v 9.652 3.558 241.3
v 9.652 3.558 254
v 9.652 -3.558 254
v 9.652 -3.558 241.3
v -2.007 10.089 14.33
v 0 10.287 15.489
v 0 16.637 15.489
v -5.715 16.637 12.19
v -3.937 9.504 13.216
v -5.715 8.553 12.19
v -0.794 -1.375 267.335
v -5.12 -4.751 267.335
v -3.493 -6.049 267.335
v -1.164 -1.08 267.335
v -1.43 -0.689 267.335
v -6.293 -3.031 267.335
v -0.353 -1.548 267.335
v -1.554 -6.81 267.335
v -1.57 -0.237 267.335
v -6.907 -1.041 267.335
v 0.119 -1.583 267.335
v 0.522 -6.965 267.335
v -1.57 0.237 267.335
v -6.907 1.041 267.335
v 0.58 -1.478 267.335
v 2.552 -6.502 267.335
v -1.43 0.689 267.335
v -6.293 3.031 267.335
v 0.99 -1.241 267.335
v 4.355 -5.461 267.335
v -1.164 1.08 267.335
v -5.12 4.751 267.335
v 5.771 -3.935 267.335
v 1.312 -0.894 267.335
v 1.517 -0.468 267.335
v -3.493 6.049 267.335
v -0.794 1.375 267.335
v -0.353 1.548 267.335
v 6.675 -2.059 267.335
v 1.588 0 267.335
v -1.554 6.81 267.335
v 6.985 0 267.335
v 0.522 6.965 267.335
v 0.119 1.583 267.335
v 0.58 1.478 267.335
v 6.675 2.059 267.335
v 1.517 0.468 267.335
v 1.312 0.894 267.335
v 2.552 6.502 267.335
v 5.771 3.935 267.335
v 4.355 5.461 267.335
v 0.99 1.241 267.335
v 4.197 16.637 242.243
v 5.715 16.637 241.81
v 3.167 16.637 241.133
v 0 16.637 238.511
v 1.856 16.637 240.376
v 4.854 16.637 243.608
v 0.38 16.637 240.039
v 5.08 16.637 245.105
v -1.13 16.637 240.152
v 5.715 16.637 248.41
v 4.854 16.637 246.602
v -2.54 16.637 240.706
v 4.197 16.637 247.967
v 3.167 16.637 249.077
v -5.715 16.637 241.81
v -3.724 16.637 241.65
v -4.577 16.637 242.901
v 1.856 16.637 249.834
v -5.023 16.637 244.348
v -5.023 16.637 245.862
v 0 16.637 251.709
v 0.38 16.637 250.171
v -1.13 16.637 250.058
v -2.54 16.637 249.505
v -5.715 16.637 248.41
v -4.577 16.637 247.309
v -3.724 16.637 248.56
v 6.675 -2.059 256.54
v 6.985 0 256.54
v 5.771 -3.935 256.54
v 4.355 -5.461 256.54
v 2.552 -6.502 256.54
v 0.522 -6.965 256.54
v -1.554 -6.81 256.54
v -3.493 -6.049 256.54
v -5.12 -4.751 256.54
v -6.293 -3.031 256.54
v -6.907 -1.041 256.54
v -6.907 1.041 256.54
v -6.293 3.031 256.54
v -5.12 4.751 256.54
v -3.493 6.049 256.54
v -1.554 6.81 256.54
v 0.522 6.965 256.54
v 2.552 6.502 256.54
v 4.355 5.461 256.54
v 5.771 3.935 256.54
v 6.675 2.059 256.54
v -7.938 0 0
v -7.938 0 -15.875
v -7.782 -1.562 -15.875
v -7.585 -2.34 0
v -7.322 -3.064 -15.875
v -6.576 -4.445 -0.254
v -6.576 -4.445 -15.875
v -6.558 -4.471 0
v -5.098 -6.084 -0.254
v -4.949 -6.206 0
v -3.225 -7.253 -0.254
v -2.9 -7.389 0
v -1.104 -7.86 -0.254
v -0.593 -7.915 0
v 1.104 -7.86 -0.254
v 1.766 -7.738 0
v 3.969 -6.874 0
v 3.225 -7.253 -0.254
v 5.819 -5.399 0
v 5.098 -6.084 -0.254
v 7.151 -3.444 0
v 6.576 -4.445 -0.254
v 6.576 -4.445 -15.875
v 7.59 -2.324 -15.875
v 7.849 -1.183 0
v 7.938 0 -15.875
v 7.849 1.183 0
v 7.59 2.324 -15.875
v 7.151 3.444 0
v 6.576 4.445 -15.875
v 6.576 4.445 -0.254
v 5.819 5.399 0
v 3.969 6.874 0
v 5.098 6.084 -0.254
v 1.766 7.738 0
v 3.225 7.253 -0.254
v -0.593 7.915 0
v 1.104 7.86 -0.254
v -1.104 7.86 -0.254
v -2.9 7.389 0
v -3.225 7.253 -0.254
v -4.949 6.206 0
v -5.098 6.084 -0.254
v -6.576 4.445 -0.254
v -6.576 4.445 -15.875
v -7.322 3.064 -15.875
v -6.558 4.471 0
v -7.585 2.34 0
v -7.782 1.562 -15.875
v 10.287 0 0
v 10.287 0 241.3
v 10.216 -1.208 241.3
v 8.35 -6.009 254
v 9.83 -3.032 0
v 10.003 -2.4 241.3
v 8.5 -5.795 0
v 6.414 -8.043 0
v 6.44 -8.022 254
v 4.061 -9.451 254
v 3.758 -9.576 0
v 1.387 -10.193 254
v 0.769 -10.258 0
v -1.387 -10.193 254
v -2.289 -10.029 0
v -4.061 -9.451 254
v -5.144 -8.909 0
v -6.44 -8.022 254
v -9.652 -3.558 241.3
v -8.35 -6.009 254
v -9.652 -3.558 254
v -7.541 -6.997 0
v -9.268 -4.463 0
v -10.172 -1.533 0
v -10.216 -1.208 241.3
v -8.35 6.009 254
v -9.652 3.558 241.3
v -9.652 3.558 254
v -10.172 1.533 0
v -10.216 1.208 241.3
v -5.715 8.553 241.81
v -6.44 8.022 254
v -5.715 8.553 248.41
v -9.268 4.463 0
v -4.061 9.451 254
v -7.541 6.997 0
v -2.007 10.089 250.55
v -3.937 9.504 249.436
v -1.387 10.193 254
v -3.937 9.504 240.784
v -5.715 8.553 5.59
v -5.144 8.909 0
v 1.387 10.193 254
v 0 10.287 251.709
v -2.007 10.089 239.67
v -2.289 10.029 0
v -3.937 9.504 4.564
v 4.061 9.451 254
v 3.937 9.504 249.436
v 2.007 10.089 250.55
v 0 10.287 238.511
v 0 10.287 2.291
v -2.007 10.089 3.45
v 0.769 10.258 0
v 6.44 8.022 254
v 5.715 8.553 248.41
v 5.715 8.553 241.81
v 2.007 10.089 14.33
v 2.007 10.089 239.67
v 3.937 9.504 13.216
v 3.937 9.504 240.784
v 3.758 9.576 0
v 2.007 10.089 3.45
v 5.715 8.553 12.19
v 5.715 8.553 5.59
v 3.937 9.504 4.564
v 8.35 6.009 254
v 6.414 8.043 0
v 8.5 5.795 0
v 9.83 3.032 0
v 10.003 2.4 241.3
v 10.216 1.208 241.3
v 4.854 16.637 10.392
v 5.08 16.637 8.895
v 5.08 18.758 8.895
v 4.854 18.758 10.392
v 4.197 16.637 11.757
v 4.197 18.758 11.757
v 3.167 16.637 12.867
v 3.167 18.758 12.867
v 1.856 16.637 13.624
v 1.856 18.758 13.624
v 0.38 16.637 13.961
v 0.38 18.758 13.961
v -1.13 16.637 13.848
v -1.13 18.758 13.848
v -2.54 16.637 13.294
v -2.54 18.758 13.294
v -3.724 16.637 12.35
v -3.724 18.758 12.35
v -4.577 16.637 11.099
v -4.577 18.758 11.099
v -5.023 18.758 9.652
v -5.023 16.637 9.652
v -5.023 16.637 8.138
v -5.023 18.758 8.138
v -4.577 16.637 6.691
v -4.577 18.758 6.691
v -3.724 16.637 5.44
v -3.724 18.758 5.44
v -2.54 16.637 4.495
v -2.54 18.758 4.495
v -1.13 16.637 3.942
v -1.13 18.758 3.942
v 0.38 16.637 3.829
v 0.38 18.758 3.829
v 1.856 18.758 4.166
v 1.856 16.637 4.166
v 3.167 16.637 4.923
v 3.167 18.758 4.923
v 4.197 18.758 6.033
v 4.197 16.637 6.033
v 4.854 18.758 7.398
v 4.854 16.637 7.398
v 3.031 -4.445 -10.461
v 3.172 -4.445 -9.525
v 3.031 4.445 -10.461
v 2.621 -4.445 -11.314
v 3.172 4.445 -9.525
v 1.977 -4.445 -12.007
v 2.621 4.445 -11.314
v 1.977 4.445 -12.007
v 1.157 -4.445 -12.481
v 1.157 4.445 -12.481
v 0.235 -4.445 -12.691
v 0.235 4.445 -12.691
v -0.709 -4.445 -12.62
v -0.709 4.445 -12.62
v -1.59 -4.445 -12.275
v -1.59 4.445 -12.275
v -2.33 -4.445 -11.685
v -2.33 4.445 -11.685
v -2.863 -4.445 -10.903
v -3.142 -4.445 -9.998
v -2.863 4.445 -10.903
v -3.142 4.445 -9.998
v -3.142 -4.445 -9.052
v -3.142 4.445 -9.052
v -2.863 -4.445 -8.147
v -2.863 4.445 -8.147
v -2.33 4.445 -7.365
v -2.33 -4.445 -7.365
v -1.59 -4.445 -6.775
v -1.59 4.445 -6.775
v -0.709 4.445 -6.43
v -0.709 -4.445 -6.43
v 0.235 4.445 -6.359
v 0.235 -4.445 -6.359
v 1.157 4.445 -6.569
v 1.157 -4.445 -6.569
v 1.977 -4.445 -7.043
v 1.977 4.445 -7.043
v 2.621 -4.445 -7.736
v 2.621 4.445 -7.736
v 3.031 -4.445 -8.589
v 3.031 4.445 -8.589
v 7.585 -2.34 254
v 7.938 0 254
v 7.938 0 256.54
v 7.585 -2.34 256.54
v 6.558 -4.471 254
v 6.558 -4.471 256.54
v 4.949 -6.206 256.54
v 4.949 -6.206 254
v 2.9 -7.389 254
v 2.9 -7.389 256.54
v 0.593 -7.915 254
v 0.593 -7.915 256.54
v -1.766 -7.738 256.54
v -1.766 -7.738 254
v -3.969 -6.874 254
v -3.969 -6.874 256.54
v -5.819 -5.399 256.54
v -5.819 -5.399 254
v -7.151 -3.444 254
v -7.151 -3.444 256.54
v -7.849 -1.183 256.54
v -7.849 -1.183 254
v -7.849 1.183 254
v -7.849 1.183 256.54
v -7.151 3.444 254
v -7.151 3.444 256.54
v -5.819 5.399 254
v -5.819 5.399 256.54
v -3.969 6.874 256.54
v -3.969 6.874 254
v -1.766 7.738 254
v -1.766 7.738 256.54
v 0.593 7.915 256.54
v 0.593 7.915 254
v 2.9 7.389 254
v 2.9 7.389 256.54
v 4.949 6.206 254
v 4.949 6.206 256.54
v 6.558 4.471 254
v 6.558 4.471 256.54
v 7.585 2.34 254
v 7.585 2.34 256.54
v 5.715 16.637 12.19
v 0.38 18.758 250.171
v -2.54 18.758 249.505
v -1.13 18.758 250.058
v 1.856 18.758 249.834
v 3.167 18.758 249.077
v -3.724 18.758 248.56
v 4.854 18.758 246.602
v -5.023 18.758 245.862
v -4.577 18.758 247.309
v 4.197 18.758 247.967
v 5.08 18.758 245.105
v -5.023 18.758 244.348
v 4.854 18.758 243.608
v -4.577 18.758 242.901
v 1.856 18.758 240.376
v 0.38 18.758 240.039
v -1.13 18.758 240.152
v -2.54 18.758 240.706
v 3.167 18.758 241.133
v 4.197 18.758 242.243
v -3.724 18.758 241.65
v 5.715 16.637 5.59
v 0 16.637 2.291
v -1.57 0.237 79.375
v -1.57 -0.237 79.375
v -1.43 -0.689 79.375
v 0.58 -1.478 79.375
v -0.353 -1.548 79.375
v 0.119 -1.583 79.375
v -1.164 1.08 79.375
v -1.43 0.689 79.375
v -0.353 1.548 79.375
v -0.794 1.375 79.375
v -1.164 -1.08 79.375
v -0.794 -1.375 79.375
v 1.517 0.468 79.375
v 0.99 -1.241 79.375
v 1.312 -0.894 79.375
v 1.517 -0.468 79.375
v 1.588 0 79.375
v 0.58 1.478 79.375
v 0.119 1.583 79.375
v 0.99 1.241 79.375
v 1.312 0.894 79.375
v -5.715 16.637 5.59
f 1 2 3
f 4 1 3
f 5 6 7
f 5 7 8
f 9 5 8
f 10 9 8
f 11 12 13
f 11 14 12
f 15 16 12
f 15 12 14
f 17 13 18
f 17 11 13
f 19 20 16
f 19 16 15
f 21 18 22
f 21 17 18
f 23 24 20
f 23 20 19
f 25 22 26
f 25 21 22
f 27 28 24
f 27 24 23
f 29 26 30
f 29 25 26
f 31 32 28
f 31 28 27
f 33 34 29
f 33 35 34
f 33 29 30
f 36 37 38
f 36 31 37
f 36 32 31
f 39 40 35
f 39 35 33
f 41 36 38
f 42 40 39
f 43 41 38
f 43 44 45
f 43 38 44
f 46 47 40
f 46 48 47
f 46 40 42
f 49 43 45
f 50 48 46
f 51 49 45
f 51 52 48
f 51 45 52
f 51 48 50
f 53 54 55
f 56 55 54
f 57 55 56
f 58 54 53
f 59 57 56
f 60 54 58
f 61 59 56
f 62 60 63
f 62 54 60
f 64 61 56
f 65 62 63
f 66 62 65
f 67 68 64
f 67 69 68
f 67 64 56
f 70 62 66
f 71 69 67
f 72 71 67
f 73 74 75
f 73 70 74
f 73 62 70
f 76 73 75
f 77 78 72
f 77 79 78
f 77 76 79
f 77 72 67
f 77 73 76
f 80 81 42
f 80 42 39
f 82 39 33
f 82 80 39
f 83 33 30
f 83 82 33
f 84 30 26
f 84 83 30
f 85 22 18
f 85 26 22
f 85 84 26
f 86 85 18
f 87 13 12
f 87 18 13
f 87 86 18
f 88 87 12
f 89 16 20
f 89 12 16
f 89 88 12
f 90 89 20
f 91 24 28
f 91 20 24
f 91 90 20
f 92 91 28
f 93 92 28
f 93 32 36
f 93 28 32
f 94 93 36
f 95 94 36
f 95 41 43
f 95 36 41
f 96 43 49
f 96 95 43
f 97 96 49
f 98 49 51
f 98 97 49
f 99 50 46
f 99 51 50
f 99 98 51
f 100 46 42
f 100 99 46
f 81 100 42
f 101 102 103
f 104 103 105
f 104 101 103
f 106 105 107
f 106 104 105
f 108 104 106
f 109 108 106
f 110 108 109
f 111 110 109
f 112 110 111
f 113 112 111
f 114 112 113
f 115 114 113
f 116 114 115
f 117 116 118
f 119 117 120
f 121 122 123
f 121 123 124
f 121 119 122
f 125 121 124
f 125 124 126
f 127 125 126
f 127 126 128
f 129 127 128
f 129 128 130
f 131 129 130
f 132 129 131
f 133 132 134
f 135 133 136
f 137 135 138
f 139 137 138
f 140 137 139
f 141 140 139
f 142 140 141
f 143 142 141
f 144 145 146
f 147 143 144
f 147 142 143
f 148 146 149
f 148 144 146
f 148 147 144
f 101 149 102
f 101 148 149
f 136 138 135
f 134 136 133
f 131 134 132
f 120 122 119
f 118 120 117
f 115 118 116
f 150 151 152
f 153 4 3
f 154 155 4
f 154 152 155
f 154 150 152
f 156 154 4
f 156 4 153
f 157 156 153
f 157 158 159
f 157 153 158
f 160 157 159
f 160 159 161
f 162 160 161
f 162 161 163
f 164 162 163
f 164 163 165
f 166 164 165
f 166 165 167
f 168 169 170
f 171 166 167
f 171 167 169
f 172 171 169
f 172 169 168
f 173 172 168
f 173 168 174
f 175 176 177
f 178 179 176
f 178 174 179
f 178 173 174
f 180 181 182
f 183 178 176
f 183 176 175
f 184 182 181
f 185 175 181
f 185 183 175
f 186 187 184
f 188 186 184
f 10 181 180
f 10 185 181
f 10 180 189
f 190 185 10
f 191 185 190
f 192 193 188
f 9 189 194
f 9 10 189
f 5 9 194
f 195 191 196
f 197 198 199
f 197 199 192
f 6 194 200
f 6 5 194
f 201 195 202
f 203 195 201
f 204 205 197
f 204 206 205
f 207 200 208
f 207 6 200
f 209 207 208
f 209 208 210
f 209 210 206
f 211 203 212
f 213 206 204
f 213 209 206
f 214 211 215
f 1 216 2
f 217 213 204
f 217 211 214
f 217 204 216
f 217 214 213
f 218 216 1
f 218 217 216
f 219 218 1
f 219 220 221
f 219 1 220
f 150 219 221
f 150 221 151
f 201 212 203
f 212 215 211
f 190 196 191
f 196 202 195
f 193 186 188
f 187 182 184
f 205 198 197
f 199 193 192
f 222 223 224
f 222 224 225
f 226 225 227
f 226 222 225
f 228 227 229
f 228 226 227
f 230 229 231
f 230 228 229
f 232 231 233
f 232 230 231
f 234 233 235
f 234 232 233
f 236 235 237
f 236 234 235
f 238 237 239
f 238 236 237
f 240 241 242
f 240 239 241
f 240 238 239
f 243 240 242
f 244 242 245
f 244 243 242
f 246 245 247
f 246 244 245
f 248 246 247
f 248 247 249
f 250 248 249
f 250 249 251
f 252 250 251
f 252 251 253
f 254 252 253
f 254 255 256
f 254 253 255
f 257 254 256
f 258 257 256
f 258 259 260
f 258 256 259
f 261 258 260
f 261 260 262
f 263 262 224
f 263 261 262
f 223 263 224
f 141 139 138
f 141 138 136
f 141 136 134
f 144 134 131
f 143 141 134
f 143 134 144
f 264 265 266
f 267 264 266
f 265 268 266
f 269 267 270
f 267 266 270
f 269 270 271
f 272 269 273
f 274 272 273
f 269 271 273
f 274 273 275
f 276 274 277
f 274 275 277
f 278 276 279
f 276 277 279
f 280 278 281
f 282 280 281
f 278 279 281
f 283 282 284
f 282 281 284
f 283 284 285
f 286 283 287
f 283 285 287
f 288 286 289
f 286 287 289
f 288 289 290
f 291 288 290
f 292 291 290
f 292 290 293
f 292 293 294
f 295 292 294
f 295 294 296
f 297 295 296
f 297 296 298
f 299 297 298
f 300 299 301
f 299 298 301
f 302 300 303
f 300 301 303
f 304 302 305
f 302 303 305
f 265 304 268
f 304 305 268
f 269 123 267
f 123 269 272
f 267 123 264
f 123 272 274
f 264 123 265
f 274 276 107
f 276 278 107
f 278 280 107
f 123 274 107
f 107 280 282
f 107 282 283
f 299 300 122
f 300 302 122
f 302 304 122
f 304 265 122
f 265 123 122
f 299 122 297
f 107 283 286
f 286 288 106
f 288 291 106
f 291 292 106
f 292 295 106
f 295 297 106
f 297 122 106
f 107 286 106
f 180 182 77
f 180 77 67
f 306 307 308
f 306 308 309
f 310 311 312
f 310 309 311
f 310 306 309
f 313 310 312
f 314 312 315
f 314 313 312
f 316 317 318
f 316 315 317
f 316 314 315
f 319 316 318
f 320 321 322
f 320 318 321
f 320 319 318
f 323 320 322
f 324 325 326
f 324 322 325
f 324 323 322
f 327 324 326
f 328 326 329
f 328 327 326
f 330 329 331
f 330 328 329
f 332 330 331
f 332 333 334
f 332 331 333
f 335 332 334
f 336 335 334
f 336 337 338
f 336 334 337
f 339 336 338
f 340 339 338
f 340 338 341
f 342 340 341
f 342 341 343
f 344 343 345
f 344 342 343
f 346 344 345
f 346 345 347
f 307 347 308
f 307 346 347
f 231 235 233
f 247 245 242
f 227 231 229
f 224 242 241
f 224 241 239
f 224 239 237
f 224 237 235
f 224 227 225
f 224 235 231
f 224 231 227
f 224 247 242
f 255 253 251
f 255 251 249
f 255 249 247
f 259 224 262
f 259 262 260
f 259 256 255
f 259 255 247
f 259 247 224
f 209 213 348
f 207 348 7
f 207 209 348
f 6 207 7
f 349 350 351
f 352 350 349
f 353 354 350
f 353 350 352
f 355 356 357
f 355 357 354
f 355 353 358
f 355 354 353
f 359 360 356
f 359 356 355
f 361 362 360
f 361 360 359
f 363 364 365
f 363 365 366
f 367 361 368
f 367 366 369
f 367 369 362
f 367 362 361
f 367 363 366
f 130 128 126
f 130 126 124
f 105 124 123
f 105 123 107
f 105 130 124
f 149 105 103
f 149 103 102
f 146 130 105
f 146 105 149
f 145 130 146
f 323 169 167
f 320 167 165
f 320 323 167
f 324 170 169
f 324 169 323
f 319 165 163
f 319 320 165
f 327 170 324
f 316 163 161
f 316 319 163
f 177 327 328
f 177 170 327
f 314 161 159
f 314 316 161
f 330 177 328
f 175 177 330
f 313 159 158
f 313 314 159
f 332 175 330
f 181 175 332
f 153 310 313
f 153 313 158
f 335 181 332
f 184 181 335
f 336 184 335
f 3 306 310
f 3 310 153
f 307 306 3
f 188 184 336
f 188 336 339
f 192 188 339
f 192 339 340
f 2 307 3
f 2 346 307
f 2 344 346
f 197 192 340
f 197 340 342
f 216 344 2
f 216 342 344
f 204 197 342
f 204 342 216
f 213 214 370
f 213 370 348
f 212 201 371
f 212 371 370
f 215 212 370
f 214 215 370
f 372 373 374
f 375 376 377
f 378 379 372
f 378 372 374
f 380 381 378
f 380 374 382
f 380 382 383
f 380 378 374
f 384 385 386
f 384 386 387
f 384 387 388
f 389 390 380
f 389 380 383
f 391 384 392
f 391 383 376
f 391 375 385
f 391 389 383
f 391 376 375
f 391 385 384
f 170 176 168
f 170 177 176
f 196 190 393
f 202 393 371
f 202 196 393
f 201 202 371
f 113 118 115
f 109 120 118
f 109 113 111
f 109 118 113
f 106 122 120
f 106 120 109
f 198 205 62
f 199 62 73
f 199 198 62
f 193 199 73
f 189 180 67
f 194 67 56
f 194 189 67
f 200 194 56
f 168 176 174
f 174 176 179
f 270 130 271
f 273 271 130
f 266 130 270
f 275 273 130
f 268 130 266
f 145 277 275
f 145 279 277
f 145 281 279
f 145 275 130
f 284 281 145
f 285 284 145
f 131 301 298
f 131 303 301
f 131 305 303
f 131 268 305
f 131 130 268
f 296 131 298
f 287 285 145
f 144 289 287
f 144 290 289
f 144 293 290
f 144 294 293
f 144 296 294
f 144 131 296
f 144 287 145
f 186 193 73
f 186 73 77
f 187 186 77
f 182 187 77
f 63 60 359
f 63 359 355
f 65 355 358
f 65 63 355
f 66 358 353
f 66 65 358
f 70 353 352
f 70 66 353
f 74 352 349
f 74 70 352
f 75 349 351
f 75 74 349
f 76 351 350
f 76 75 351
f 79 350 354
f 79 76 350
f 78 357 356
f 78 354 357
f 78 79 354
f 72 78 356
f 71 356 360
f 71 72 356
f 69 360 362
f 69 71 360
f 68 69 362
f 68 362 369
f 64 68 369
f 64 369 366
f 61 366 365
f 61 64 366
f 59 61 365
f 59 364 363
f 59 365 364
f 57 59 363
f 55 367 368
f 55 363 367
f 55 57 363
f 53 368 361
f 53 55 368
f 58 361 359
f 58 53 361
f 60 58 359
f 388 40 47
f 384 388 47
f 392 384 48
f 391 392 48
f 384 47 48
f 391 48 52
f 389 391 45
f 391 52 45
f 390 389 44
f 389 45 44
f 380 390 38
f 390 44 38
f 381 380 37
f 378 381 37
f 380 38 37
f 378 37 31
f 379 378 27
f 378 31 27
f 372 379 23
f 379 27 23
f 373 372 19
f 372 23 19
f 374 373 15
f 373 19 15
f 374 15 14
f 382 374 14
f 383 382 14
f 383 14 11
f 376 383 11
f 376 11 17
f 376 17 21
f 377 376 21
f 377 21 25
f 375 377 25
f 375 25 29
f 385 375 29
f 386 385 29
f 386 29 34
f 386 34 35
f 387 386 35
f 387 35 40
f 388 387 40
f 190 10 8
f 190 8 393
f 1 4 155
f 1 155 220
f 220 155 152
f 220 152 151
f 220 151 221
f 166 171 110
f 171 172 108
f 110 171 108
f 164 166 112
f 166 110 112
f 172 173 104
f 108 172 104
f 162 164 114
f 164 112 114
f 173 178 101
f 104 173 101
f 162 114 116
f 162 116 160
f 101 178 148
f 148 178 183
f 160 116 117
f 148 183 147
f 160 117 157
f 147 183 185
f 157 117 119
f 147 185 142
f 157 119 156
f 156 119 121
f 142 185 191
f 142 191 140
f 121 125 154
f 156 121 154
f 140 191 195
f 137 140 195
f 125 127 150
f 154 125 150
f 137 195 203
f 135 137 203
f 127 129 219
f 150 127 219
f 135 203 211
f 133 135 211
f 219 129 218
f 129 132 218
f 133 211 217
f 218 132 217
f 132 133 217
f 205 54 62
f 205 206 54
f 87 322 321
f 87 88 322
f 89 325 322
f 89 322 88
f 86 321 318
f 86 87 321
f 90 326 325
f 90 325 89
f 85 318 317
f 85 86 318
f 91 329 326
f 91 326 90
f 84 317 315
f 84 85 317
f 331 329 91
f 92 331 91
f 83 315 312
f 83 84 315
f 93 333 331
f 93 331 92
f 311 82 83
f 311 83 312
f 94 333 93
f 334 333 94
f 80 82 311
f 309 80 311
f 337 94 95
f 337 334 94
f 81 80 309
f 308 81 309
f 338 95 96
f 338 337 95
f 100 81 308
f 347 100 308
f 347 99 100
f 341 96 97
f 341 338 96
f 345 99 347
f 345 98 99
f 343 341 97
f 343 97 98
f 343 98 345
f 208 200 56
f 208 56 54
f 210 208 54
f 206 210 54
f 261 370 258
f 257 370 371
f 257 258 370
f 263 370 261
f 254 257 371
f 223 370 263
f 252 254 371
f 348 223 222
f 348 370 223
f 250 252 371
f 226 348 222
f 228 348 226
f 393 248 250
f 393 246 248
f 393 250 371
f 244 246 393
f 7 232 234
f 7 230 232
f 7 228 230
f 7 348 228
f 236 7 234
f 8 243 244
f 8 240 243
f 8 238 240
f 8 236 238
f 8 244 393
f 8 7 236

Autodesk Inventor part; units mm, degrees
ref_plane "YZ Plane" through (0, 0, 0) normal (1, 0, 0) x (0, 1, 0)
ref_plane "XY Plane" through (0, 0, 0) normal (0, 0, 1) x (1, 0, 0)
sketch "Sketch1" plane through (0, 0, 0) normal (0, 0, 1) x (1, 0, 0)
  circle A0 centre (0, 0) radius 10.287
  dimension "d0" = 20.574
extrude "Extrusion1" add sketch "Sketch1" along normal blind 254
ref_plane "Work Plane1" through (0, 10.287, 0) normal (0, 1, 0) x (-1, 0, 0)
sketch "Sketch2" plane through (0, 10.287, 0) normal (0, 1, 0) x (-1, 0, 0)
  line L0 (5.715, 241.8104) -> (0, 238.5109)
  line L1 (0, 238.5109) -> (-5.715, 241.8104)
  line L2 (-5.715, 241.8104) -> (-5.715, 248.4096)
  line L3 (-5.715, 248.4096) -> (0, 251.7091)
  line L4 (0, 251.7091) -> (5.715, 248.4096)
  line L5 (5.715, 248.4096) -> (5.715, 241.8104)
  line L6 (5.715, 5.5904) -> (0, 2.2909)
  line L7 (0, 2.2909) -> (-5.715, 5.5904)
  line L8 (-5.715, 5.5904) -> (-5.715, 12.1896)
  line L9 (-5.715, 12.1896) -> (0, 15.4891)
  line L10 (0, 15.4891) -> (5.715, 12.1896)
  line L11 (5.715, 12.1896) -> (5.715, 5.5904)
  line L12 (10.287, 0) -> (10.287, 254) projected
  line L13 (10.287, 254) -> (-10.287, 254) projected
  line L14 (-10.287, 0) -> (10.287, 0) projected
  point P0 (0, 0)
  point P1 (0, 245.11)
  point P2 (0, 8.89)
  dimension "d3" = 11.43
  dimension "d4" = 11.43
  dimension "d5" = 8.89
  dimension "d6" = 8.89
  dimension "d7" = 10.287
  dimension "d8" = 10.287
extrude "Extrusion2" add sketch "Sketch2" along normal mid plane 12.7
sketch "Sketch3" plane through (0, 16.637, 0) normal (0, 1, 0) x (1, 0, 0)
  line L0 (0, -2.2909) -> (-5.715, -5.5904) projected
  line L1 (-5.715, -5.5904) -> (-5.715, -12.1896) projected
  line L2 (-5.715, -12.1896) -> (0, -15.4891) projected
  line L3 (0, -15.4891) -> (5.715, -12.1896) projected
  line L4 (5.715, -12.1896) -> (5.715, -5.5904) projected
  line L5 (5.715, -5.5904) -> (0, -2.2909) projected
  line L6 (0, -238.5109) -> (-5.715, -241.8104) projected
  line L7 (-5.715, -241.8104) -> (-5.715, -248.4096) projected
  line L8 (-5.715, -248.4096) -> (0, -251.7091) projected
  line L9 (0, -251.7091) -> (5.715, -248.4096) projected
  line L10 (5.715, -248.4096) -> (5.715, -241.8104) projected
  line L11 (5.715, -241.8104) -> (0, -238.5109) projected
  circle A0 centre (0, -245.1051) radius 5.08
  circle A1 centre (0, -8.8949) radius 5.08
  point P0 (0, 0)
  dimension "d11" = 10.16
  dimension "d12" = 10.16
  dimension "d13" = 5.715
  dimension "d14" = 5.715
  dimension "d15" = 6.604
  dimension "d16" = 6.604
extrude "Extrusion3" add sketch "Sketch3" along normal blind 2.1209 contours A0 | A1
sketch "Sketch6" plane through (0, 0, 0) normal (0, 0, -1) x (-1, 0, 0)
  circle A0 centre (0, 0) radius 10.287 projected
  circle A1 centre (0, 0) radius 7.9375
  dimension "d33" = 15.875
extrude "Extrusion5" add sketch "Sketch6" along normal blind 0.254 contours A1
sketch "Sketch7" plane through (0, 0, -0.254) normal (0, 0, -1) x (-1, 0, 0)
  circle A0 centre (0, 0) radius 7.9375 projected
  line L0 (0, 16.637) -> (5.715, 16.637) projected
  line L1 (-6.5762, 4.445) -> (6.5762, 4.445)
  line L2 (-6.5762, -4.445) -> (6.5762, -4.445)
  arc A1 (-6.5762, 4.445) -> (-6.5762, -4.445) centre (0, 0) ccw
  arc A2 (6.5762, -4.445) -> (6.5762, 4.445) centre (0, 0) ccw
  dimension "d42" = 0
  dimension "d44" = 8.89
  dimension "d45" = 4.445
thread "Thread1" size "3/4-10 UNC" class "2A" standard "ANSI Unified Screw Threads" full length
extrude "Extrusion7" add sketch "Sketch7" along normal blind 15.621 contours A0 L2 L1
sketch "Sketch8" plane through (-6.5762, 4.445, -0.254) normal (0, 1, 0) x (1, 0, 0)
  circle A0 centre (6.5737, 9.271) radius 3.175
  line L0 (13.1523, 0) -> (13.1523, 15.621) projected
  line L1 (0, 15.621) -> (13.1523, 15.621) projected
  point P0 (6.5762, -0.254)
  dimension "d48" = 6.35
  dimension "d49" = 6.5786
  dimension "d50" = 6.35
extrude "Extrusion8" cut sketch "Sketch8" against normal blind 15.621
sketch "Sketch9" plane through (0, 0, 254) normal (0, 0, 1) x (1, 0, 0)
  circle A0 centre (0, 0) radius 7.9375 projected
  circle A1 centre (0, 0) radius 7.9375
  dimension "d53" = 15.875
extrude "Extrusion9" add sketch "Sketch9" along normal blind 2.54
sketch "Sketch10" plane through (0, 0, 254) normal (0, 0, 1) x (1, 0, 0)
  circle A0 centre (0, 0) radius 7.9375 projected
  circle A1 centre (0, 0) radius 10.287 projected
  line L0 (-9.652, 3.5583) -> (-9.652, -3.5583)
  line L1 (9.652, 3.5583) -> (9.652, -3.5583)
  line L2 (-5.715, 16.637) -> (-5.715, 8.5534) projected
  arc A2 (9.652, -3.5583) -> (9.652, 3.5583) centre (0, 0) ccw
  arc A3 (-9.652, 3.5583) -> (-9.652, -3.5583) centre (0, 0) ccw
  dimension "d58" = 19.304
  dimension "d59" = 9.652
extrude "Extrusion10" cut sketch "Sketch10" against normal blind 12.7 contours A1 L1 | A1 L0
sketch "Sketch11" plane through (0, 0, 256.54) normal (0, 0, 1) x (1, 0, 0)
  circle A0 centre (0, 0) radius 6.985
  dimension "d62" = 13.97
extrude "Extrusion11" add sketch "Sketch11" along normal blind 10.795
thread "Thread2" size "1/4-20 UNC" class "2A" standard "ANSI Unified Screw Threads" length 25.4 offset 1.905
sketch "Sketch12" plane through (0, 0, 267.335) normal (0, 0, 1) x (1, 0, 0)
  circle A0 centre (0, 0) radius 1.5875
  dimension "d67" = 3.175
extrude "Extrusion12" cut sketch "Sketch12" against normal blind 187.96
equation "\"d4\" = d3"
equation "\"d6\" = d5"
equation "\"d8\" = d7"
equation "\"d14\" = d13"
equation "\"d15\" = d16"
properties part number "RobotArm Cylinder"
